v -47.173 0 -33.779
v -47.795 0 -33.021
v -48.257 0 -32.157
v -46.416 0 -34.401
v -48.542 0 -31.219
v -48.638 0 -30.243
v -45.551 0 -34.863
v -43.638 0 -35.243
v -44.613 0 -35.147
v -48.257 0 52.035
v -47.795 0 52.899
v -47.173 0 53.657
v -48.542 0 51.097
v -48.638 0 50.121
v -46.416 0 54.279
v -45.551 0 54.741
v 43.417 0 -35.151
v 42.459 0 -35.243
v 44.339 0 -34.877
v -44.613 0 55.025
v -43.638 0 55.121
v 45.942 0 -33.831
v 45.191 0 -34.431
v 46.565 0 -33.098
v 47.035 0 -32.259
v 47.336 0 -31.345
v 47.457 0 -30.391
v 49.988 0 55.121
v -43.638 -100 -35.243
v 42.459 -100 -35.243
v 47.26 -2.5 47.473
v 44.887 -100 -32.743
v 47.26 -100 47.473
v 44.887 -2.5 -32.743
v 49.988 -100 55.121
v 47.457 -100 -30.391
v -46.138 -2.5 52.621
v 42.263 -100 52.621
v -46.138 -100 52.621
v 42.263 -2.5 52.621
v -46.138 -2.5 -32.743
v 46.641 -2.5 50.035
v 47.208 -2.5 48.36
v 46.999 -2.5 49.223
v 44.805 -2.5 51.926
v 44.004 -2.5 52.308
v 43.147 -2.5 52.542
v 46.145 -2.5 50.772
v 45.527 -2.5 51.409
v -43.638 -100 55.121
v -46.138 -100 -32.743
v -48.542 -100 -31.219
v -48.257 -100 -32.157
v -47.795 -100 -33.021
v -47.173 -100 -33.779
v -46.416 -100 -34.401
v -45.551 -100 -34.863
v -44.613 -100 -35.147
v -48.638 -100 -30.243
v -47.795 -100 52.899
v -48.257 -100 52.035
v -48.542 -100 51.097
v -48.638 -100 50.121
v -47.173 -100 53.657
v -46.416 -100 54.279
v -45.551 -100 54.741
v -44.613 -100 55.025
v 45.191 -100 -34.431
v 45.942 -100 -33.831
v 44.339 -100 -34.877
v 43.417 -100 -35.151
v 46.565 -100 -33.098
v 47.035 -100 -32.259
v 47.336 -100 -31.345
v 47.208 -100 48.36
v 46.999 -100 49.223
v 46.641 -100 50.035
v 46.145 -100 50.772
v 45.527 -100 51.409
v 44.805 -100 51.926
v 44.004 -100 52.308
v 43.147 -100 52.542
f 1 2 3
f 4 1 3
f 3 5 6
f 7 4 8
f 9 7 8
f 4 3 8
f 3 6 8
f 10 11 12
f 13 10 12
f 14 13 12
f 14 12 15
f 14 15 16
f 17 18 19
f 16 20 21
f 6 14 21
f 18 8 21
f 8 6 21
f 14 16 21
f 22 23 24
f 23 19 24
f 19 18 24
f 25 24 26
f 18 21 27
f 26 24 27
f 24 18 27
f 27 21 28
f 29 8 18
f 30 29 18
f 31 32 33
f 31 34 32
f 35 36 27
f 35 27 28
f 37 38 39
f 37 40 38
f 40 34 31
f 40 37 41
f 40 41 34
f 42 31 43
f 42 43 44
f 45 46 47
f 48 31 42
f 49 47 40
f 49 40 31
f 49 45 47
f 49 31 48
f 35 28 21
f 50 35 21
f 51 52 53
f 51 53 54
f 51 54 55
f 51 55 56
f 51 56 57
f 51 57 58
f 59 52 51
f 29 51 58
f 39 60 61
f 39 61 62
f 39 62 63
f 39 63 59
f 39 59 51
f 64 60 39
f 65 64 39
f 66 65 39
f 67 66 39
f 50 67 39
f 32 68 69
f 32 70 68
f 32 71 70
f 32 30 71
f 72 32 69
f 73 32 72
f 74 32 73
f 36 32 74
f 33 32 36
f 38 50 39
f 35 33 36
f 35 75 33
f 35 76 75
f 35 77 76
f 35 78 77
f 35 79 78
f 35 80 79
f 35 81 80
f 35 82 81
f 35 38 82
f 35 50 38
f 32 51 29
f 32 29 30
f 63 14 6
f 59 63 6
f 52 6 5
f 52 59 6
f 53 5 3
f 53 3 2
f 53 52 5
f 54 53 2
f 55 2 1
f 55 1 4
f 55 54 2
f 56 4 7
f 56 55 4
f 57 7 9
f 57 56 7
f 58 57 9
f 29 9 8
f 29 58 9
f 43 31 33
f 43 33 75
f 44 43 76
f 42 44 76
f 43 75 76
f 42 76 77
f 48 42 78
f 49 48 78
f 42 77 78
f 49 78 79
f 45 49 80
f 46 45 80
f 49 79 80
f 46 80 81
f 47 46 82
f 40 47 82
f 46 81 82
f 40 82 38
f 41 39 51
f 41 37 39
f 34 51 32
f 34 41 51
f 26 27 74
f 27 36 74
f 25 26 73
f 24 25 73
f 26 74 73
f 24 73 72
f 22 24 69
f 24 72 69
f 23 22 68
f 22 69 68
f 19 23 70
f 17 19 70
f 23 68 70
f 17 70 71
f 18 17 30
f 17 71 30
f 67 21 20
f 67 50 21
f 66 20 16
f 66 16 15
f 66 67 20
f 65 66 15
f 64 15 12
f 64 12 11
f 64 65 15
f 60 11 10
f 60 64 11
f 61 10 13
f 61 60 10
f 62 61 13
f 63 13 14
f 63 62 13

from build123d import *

# Parameters (mm, degrees)
F1_DEPTH = 100
F2_T     = -2.5
F3_R     = 5


with BuildPart() as f1:
    # F0 (on Front) → F1 (new body)
    with BuildSketch(Plane.XZ):
        Polygon((47.3136231303, -35.2433100343), (49.9879084527, 55.1212131977), (-48.6377365887, 55.1212131977), (-48.6377365887, -35.2433100343), align=None)
    extrude(amount=F1_DEPTH)

    # F2
    f2_openings = [f1.faces().sort_by_distance(p)[0] for p in [
        (0.009578, -100, 10.145948),
    ]]
    offset(amount=F2_T, openings=f2_openings)

    # F3
    f3_edges = [f1.edges().sort_by_distance(p)[0] for p in [
        (-48.637737, -50, 55.121213),
        (47.412828, -51.25, 52.621213),
        (-48.637737, -50, -35.24331),
        (47.313623, -50, -35.24331),
    ]]
    fillet(f3_edges, radius=F3_R)


solid = f1.part
